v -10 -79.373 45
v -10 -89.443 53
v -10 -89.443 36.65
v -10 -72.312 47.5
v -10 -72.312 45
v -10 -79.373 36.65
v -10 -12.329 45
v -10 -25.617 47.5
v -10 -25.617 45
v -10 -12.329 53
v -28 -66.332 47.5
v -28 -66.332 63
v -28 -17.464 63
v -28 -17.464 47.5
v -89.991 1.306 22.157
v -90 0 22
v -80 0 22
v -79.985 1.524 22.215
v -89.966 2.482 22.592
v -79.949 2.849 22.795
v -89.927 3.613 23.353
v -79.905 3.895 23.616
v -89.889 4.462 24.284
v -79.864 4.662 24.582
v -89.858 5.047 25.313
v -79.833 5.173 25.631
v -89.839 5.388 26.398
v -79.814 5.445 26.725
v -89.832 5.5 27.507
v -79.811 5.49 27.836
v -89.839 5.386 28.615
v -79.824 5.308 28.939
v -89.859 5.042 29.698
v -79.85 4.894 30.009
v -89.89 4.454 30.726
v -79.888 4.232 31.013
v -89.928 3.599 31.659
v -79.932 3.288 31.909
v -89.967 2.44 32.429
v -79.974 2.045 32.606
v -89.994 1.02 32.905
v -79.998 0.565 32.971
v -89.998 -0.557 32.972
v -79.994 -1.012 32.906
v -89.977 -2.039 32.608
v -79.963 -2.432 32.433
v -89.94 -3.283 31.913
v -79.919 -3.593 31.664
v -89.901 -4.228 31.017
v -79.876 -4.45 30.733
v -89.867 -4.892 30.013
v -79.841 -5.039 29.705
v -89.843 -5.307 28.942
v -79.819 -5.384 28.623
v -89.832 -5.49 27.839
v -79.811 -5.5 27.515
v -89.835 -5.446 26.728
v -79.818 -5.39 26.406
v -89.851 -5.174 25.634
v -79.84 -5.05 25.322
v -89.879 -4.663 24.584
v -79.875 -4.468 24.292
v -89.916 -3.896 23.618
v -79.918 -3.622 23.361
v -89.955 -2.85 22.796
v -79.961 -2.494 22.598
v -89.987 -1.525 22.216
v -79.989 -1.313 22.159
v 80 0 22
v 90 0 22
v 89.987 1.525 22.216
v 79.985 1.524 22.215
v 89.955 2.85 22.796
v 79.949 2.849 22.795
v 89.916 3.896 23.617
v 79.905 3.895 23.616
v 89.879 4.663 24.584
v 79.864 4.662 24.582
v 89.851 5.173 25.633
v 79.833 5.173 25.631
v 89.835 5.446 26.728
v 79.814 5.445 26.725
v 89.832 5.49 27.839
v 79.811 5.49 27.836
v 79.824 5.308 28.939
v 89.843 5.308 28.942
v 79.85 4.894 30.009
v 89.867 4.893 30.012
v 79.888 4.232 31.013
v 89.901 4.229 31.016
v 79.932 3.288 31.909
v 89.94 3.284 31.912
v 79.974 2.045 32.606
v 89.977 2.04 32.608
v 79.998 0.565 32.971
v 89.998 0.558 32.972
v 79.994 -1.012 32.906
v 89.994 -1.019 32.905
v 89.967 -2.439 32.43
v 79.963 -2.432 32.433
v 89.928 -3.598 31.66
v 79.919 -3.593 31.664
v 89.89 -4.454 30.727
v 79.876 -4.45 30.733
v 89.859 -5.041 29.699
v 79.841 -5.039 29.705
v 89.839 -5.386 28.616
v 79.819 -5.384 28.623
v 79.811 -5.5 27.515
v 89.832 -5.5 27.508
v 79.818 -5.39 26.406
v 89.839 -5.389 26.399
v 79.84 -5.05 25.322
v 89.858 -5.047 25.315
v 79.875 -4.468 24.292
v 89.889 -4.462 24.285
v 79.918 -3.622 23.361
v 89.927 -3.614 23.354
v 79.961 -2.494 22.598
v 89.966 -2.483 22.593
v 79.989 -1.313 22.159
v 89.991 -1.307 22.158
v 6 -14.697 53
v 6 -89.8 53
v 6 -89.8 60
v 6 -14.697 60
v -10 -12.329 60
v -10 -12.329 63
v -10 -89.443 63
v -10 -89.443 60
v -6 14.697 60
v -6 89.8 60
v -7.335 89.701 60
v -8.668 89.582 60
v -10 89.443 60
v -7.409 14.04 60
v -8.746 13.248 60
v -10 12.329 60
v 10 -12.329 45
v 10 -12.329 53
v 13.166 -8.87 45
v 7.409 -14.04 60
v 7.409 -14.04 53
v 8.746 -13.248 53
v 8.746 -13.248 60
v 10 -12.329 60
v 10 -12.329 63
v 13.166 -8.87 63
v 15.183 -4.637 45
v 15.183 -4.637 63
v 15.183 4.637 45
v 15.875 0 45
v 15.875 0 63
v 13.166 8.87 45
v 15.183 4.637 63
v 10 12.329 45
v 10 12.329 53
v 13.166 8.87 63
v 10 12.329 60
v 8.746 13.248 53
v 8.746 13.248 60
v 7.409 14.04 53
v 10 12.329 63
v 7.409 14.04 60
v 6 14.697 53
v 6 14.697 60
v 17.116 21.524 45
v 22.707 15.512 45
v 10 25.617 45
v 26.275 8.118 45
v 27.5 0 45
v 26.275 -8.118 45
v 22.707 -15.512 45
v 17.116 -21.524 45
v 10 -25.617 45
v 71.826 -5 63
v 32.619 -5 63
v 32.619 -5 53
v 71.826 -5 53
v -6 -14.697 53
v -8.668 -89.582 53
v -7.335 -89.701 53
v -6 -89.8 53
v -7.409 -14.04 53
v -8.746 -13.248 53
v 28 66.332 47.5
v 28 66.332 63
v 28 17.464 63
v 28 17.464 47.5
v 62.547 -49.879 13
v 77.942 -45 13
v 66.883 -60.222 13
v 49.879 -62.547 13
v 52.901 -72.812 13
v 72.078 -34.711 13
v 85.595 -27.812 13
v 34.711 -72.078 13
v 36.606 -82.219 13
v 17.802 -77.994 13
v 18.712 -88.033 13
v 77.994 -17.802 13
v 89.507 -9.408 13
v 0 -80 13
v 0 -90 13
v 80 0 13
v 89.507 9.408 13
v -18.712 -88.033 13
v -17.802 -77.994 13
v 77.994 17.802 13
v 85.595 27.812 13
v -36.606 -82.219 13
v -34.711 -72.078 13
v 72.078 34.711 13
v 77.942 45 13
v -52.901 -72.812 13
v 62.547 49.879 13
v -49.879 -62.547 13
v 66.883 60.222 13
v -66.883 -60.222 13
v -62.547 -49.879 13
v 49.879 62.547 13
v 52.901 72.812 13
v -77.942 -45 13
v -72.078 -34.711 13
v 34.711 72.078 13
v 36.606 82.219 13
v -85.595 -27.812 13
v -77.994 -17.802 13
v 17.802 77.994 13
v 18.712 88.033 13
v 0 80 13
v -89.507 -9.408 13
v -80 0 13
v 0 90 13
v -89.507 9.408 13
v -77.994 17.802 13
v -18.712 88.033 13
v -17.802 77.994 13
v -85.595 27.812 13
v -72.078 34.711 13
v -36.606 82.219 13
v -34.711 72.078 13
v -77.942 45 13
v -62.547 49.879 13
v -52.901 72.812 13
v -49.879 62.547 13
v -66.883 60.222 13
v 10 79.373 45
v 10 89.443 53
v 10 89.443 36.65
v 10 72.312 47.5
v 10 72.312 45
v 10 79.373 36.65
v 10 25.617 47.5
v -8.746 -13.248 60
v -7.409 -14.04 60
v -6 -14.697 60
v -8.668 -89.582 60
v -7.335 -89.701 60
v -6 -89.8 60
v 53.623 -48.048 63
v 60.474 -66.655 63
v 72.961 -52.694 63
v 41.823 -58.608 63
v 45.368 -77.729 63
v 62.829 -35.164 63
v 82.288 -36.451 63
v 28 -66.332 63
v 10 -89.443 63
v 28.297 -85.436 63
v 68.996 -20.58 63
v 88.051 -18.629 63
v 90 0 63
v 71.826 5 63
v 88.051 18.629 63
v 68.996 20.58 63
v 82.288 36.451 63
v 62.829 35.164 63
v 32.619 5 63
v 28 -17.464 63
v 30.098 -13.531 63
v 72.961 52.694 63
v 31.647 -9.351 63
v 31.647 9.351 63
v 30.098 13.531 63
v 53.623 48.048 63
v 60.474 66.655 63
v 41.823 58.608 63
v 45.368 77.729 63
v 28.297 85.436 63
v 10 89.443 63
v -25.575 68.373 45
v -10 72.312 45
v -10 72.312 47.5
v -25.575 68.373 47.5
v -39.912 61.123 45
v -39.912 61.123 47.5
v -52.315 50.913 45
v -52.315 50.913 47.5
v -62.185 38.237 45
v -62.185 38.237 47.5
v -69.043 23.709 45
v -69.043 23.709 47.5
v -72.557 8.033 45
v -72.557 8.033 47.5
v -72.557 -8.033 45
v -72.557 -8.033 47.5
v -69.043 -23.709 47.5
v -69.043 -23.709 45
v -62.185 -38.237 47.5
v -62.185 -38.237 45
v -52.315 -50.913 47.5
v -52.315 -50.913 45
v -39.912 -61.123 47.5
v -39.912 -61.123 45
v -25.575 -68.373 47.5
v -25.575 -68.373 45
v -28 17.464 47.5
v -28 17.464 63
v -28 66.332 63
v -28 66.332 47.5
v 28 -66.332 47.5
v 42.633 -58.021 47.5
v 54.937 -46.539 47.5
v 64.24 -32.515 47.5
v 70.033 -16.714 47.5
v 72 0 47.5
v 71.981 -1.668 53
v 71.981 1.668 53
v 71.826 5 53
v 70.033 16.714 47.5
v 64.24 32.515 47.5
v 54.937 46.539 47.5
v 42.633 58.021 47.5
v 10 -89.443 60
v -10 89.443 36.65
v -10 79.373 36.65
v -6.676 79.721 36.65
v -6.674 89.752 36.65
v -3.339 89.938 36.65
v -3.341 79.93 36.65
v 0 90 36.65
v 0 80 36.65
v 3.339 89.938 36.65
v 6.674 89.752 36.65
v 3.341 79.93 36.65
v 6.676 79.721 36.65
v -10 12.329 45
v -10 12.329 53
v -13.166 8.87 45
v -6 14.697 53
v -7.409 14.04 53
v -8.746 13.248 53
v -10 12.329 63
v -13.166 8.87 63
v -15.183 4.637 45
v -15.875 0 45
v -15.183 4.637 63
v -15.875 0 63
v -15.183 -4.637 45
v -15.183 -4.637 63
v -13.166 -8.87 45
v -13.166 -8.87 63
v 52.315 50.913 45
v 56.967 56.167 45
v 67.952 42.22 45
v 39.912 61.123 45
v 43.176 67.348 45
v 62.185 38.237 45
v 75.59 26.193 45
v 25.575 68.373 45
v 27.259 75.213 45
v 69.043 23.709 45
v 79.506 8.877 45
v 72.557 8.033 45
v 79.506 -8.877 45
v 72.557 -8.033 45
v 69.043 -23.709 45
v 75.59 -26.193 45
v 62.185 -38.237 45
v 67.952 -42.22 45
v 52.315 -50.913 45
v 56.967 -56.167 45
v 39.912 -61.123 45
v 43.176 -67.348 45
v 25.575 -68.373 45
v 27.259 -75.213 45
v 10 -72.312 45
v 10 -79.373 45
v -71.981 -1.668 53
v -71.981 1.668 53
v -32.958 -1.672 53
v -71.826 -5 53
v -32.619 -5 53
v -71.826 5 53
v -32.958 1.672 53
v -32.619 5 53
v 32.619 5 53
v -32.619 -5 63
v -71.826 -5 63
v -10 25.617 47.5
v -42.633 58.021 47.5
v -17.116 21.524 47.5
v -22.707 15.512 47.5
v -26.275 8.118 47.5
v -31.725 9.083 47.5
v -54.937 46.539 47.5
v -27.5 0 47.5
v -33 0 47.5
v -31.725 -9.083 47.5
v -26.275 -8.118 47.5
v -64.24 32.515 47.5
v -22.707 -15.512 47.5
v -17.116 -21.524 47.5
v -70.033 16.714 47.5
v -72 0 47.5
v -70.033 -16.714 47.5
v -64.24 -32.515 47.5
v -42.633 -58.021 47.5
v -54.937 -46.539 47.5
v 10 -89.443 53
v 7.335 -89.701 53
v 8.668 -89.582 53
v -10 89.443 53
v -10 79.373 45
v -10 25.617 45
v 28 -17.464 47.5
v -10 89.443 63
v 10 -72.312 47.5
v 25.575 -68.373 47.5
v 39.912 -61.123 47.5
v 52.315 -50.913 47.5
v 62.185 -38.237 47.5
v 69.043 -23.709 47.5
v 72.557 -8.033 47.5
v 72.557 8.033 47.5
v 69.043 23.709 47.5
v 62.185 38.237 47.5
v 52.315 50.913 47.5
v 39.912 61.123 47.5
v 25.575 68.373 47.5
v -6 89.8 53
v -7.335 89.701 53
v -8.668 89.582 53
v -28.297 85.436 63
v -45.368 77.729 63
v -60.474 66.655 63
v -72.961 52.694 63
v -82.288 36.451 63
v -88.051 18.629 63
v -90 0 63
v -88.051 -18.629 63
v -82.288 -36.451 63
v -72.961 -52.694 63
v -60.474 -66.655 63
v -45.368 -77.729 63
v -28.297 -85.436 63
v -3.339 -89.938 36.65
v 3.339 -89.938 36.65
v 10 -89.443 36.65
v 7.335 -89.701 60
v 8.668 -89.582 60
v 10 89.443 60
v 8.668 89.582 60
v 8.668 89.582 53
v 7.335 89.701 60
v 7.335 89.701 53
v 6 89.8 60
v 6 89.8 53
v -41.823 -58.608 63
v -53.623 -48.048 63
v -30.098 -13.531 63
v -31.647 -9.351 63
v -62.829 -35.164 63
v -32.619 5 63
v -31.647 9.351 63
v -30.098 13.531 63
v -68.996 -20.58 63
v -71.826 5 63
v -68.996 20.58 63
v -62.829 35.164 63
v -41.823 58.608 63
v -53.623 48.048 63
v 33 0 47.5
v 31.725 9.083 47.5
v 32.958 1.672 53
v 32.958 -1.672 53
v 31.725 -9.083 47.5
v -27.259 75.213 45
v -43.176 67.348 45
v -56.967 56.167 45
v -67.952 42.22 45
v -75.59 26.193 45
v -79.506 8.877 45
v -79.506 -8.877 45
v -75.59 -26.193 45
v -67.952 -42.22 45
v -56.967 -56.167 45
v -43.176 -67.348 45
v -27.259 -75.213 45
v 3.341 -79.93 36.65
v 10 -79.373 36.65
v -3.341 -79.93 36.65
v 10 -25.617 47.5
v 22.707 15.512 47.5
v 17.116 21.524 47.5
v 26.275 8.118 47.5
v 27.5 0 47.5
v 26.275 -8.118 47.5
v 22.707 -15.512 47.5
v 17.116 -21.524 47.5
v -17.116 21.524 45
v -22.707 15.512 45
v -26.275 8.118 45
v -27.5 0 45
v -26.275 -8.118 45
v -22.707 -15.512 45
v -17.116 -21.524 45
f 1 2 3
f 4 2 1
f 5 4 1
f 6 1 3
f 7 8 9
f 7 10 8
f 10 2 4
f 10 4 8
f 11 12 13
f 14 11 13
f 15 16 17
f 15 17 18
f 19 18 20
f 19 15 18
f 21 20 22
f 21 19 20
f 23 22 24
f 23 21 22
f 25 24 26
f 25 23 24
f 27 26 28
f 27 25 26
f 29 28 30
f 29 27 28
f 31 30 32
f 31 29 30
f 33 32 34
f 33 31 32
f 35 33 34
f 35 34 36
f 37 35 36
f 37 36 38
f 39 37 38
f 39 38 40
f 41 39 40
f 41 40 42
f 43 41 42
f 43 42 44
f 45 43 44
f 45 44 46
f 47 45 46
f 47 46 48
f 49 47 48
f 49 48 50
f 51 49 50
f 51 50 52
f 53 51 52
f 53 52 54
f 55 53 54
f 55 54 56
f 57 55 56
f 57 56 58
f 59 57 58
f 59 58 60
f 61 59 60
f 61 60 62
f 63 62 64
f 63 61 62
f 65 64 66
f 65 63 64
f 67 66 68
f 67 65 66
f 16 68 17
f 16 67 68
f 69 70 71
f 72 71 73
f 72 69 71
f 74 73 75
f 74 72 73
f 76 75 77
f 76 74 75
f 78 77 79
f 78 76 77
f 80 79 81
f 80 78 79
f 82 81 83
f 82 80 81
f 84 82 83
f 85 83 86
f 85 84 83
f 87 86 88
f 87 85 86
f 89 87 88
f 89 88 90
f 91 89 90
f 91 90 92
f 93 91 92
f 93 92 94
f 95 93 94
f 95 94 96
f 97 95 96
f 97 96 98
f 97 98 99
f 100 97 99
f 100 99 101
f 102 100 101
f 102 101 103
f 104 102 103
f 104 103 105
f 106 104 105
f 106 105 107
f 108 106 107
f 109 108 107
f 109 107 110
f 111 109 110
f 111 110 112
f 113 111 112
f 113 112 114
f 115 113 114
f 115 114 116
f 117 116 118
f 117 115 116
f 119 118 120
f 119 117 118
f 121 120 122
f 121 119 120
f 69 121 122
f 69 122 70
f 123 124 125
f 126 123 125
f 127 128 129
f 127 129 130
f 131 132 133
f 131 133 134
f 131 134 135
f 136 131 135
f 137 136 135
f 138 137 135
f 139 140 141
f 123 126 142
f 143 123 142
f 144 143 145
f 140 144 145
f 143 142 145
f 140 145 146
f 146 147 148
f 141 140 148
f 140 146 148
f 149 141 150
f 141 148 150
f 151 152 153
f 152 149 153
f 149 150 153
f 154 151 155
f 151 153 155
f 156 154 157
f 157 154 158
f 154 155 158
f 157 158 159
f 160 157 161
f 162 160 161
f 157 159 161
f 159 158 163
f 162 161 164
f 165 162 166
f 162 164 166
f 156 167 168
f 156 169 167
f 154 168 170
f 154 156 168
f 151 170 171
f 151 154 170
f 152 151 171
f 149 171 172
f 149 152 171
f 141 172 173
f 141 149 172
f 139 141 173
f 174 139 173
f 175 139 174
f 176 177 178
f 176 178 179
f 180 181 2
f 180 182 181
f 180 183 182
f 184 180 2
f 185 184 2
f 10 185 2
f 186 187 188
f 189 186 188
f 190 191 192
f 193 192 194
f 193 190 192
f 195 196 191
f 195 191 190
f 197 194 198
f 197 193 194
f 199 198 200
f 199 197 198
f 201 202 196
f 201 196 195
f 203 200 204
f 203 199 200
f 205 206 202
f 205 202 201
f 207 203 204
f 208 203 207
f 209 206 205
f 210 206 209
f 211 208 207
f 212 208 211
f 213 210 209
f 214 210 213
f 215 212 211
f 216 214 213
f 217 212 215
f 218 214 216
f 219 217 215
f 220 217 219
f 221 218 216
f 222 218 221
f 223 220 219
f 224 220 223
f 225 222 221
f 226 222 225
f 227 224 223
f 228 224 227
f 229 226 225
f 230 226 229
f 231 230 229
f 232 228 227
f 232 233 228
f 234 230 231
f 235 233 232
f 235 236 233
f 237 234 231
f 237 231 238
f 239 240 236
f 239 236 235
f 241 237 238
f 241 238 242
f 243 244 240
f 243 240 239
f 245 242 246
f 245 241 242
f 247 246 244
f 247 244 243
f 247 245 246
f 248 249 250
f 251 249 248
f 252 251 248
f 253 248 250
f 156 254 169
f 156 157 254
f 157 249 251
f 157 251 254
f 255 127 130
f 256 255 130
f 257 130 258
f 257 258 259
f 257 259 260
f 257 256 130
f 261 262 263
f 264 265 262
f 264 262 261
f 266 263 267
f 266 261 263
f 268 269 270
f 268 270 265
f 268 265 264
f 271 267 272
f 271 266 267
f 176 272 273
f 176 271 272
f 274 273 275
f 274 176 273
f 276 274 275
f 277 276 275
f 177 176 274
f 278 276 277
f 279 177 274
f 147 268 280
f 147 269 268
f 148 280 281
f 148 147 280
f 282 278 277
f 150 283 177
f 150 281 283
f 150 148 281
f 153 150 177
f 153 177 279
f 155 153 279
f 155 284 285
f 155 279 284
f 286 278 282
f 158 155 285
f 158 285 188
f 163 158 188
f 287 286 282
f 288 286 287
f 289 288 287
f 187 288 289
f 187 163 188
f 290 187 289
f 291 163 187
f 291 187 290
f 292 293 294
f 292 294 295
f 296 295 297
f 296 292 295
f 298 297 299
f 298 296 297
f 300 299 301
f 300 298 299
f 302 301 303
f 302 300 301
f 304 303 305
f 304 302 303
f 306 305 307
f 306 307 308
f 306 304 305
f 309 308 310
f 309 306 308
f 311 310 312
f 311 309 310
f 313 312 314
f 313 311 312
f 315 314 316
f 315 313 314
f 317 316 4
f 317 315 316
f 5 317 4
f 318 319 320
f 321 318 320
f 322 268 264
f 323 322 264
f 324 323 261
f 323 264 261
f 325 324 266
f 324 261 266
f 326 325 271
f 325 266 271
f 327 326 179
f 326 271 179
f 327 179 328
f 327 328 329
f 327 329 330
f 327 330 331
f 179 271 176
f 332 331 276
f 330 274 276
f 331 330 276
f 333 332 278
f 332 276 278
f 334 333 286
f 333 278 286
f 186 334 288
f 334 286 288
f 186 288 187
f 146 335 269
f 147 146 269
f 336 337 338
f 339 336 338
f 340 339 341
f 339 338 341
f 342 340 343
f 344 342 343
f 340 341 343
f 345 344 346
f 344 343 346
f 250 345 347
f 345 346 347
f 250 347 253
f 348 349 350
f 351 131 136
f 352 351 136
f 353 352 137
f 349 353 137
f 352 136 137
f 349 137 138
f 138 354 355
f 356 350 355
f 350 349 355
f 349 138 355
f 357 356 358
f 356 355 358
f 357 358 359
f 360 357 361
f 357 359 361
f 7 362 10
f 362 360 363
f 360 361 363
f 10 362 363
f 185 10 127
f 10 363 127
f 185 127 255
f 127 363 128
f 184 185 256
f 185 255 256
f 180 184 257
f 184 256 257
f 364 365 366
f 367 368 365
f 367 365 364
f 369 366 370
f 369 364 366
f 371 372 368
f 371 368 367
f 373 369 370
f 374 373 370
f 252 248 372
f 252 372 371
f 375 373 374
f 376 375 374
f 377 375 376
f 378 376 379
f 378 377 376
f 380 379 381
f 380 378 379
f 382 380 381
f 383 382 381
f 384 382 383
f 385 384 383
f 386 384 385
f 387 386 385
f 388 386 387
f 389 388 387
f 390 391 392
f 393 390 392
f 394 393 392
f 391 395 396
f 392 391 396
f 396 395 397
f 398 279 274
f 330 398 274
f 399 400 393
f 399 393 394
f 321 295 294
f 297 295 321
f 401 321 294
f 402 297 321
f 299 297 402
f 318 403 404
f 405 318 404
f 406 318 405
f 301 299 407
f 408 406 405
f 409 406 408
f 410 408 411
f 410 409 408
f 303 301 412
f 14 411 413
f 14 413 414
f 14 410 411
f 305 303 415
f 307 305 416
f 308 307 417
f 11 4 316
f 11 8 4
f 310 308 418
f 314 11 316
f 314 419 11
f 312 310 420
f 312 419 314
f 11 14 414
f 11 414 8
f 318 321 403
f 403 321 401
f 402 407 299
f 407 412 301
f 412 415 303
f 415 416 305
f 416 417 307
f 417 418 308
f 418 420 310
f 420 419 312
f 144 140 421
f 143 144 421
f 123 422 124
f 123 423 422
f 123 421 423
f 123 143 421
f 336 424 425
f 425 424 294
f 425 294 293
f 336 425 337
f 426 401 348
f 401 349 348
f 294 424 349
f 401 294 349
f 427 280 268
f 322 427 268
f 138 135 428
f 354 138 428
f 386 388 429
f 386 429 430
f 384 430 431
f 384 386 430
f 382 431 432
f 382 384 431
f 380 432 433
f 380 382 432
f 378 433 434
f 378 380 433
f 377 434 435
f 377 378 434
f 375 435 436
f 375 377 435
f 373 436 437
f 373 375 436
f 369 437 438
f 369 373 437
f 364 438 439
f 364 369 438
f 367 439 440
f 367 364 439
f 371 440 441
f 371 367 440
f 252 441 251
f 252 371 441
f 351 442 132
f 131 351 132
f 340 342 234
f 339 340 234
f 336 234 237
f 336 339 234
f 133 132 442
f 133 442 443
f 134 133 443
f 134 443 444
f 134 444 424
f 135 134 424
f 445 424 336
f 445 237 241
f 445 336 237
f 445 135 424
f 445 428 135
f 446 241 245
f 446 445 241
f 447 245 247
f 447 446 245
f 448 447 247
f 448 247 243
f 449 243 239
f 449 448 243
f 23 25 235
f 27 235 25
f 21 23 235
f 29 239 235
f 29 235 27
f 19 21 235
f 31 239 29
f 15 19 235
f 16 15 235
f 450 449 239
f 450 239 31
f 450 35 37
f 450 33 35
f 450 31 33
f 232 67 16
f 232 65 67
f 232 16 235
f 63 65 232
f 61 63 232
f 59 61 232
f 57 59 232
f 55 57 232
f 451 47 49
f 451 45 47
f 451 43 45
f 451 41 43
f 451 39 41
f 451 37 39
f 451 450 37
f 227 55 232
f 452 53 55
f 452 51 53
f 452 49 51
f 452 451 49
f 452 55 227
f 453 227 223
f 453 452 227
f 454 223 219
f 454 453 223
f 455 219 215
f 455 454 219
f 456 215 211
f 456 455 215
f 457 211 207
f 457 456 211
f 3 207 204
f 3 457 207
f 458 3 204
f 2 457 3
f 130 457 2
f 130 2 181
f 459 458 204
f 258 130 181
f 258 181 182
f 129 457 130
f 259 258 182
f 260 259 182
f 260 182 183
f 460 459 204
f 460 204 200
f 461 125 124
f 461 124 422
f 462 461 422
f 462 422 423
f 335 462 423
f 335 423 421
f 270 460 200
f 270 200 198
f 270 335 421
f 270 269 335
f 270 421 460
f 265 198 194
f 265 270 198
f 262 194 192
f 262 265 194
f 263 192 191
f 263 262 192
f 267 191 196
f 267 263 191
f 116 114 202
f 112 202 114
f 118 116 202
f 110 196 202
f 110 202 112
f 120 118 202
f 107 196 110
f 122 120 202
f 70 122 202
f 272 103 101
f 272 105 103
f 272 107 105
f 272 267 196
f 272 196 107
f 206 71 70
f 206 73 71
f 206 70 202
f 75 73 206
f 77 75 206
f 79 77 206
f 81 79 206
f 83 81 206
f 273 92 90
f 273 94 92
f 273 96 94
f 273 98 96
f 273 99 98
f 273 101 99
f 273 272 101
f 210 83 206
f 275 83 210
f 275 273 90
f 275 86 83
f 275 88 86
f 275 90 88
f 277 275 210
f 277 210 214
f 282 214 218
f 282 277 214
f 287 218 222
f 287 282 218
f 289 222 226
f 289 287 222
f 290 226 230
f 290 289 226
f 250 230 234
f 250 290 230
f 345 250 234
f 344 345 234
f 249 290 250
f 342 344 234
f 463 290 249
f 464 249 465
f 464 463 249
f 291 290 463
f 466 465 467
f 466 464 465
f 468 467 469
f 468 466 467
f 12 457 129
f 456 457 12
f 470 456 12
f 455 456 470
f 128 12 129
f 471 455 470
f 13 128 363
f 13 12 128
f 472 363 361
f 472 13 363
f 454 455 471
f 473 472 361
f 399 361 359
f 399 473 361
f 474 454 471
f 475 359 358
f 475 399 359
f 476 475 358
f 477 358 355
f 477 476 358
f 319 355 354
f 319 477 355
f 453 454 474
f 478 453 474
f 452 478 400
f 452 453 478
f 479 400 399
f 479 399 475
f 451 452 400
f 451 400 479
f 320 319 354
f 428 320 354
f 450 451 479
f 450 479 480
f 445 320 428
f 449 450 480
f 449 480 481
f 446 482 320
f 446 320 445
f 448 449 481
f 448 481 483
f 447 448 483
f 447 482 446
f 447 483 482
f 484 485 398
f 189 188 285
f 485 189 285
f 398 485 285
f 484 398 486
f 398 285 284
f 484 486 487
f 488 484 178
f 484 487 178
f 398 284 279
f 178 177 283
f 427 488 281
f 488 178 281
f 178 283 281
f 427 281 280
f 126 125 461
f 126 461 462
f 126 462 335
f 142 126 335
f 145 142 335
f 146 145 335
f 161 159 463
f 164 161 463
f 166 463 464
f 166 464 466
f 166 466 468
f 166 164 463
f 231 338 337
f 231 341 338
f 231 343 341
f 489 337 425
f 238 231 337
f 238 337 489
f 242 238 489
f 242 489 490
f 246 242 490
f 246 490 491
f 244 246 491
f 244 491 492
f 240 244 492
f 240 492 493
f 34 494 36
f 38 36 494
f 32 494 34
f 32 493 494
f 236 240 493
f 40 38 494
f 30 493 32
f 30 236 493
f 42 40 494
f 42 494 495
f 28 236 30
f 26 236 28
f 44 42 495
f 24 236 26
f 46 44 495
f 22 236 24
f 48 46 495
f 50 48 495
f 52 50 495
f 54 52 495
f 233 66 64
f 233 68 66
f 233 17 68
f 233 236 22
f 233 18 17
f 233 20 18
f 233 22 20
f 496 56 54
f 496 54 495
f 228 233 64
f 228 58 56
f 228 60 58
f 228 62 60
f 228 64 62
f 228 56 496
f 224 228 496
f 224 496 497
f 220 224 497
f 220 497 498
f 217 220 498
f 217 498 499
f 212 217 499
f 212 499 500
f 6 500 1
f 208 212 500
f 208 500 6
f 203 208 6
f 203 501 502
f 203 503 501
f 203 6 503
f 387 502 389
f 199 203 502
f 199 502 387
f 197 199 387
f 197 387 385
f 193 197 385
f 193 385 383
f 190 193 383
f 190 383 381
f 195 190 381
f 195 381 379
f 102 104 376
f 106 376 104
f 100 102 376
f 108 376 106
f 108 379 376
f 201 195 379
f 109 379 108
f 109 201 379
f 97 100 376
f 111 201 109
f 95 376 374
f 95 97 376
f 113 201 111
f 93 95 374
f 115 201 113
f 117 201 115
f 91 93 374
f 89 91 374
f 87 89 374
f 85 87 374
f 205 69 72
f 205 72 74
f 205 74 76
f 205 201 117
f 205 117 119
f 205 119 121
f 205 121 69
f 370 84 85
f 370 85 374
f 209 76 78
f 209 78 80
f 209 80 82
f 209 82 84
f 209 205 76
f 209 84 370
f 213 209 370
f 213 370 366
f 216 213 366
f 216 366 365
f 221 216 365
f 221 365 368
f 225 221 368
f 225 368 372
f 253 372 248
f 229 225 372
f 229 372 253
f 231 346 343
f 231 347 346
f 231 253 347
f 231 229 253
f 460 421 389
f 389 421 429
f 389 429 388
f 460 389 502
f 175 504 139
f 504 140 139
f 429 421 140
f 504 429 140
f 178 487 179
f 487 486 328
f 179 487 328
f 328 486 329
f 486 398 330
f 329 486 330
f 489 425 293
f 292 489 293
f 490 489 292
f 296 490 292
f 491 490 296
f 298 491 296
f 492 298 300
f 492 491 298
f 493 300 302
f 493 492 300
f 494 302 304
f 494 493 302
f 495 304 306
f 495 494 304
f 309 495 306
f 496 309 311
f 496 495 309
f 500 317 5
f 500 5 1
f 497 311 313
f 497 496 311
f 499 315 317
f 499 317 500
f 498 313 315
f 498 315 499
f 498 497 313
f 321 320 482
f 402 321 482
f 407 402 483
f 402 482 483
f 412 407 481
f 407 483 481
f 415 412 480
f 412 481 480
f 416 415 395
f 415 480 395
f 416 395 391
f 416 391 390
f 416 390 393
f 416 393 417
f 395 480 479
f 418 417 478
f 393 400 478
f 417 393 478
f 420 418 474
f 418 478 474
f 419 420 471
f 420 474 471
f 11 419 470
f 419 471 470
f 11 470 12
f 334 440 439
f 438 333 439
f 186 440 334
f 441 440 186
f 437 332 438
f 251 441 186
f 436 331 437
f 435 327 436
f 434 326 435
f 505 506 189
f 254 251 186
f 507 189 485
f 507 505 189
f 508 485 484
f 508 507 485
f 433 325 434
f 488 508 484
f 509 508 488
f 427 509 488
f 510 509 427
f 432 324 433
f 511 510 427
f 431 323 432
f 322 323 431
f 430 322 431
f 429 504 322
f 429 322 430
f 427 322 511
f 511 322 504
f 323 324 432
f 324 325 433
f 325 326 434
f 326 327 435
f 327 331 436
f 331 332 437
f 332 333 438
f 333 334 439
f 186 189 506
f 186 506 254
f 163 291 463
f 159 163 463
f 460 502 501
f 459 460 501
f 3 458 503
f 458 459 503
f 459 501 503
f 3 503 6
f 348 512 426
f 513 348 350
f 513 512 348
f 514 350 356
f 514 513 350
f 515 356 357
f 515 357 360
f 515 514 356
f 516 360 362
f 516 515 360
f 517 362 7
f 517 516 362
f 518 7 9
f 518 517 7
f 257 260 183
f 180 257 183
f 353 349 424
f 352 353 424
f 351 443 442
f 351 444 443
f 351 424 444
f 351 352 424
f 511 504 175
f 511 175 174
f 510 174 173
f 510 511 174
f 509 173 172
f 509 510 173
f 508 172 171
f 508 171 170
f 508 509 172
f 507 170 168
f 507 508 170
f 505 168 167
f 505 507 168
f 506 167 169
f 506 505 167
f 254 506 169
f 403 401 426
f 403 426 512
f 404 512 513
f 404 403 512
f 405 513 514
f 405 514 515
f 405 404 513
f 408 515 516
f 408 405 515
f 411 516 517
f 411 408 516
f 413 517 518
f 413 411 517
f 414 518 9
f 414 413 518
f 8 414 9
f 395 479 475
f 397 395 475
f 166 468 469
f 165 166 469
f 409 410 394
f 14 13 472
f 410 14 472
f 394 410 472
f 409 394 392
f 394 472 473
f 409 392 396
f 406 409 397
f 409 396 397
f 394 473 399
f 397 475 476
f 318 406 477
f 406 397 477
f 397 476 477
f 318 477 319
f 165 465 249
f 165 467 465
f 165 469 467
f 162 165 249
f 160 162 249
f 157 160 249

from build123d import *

# Parameters (mm, degrees)
CUT_EXTRUDE1_DEPTH       = 91
CUT_EXTRUDE13_START      = 79.372539
SKETCH35_W               = 20
SKETCH35_H               = 8.35
CUT_EXTRUDE13_DEPTH      = 10.627461
CIRPATTERN1_COUNT        = 2
CUT_EXTRUDE14_DEPTH      = 64
SKETCH38_W               = 301.896550135
SKETCH38_H               = 232.512752758
CUT_EXTRUDE15_DEPTH      = 13
SKETCH39_W               = 54.010562882
SKETCH39_H               = 10
SKETCH39_W_2             = 56.106077308
BOSS_EXTRUDE1_DEPTH      = 10
SKETCH17_R               = 5.5
CUT_EXTRUDE18_DEPTH      = 181
CUT_EXTRUDE18_DEPTH_BACK = 1
SKETCH42_R               = 15.875
CUT_EXTRUDE19_DEPTH      = 40


with BuildPart() as part:
    # Sketch3 → Revolve2 (revolve)
    with BuildSketch(Plane(origin=(0, 0, 0), x_dir=(0, 0, -1), z_dir=(1, 0, 0))):
        Polygon((-45, 80), (0, 80), (0, 90), (-63, 90), (-63, 15), (-45, 15), (-45, 27.5), (-47.5, 27.5), (-47.5, 73), (-45, 73), align=None)
    revolve(axis=Axis((0, 0, 0), (0, 0, 1)))

    # Sketch4 → Cut-Extrude1 (cut, through all)
    with BuildSketch(Plane(origin=(0, 0, 0), x_dir=(1, 0, 0), z_dir=(0, 1, 0))):
        Polygon((10, -53), (10, -45), (-10, -45), (-10, -53), (-6, -53), (-6, -60), (-10, -60), (-10, -63), (10, -63), (10, -60), (6, -60), (6, -53), align=None)
    cut_extrude1 = extrude(amount=CUT_EXTRUDE1_DEPTH, mode=Mode.SUBTRACT)

    # Sketch35 → Cut-Extrude13 (cut)
    with BuildSketch(Plane(origin=(0, 0, 0), x_dir=(1, 0, 0), z_dir=(0, 1, 0)).offset(CUT_EXTRUDE13_START)):
        with Locations((0, -40.825)):
            Rectangle(SKETCH35_W, SKETCH35_H)
    cut_extrude13 = extrude(amount=CUT_EXTRUDE13_DEPTH, mode=Mode.SUBTRACT)

    # CirPattern1: Cut-Extrude1, Cut-Extrude13 ×2 about axis
    cirpattern1_axis = Axis((0, 0, 0), (0, 0, 1))
    for i in range(1, CIRPATTERN1_COUNT):
        add(cut_extrude1.rotate(cirpattern1_axis, i * 360 / CIRPATTERN1_COUNT), mode=Mode.SUBTRACT)
        add(cut_extrude13.rotate(cirpattern1_axis, i * 360 / CIRPATTERN1_COUNT), mode=Mode.SUBTRACT)

    # Sketch37 → Cut-Extrude14 (cut, through all)
    with BuildSketch(Plane.XY.offset(63)):
        with BuildLine():
            Line((-28, -66.332495807), (-28, -17.464249197))
            ThreePointArc((-28, -17.464249197), (-33, 0), (-28, 17.464249197))
            Line((-28, 17.464249197), (-28, 66.332495807))
            ThreePointArc((-28, 66.332495807), (-72, 0), (-28, -66.332495807))
        make_face()
        with BuildLine():
            Line((28, -17.464249197), (28, -66.332495807))
            ThreePointArc((28, -66.332495807), (72, 0), (28, 66.332495807))
            Line((28, 66.332495807), (28, 17.464249197))
            ThreePointArc((28, 17.464249197), (33, 0), (28, -17.464249197))
        make_face()
    extrude(amount=-CUT_EXTRUDE14_DEPTH, mode=Mode.SUBTRACT)

    # Sketch38 → Cut-Extrude15 (cut)
    with BuildSketch(Plane(origin=(0, 0, 0), x_dir=(-1, 0, 0), z_dir=(0, 0, -1))):
        with Locations((8.285843347, -5.180042081)):
            Rectangle(SKETCH38_W, SKETCH38_H)
    extrude(amount=-CUT_EXTRUDE15_DEPTH, mode=Mode.SUBTRACT)

    # Sketch39 → Boss-Extrude1 (add)
    with BuildSketch(Plane.XY.offset(63)):
        with Locations((47.183112068, 0)):
            Rectangle(SKETCH39_W, SKETCH39_H)
        with Locations((-51.507331201, 0)):
            Rectangle(SKETCH39_W_2, SKETCH39_H)
    extrude(amount=-BOSS_EXTRUDE1_DEPTH)

    # Sketch17 → Cut-Extrude18 (cut, two sides)
    with BuildSketch(Plane(origin=(-90, 0, 0), x_dir=(0, 0, -1), z_dir=(1, 0, 0))) as cut_extrude18_sk:
        with Locations((-27.5, 0)):
            Circle(SKETCH17_R)
    extrude(amount=CUT_EXTRUDE18_DEPTH, mode=Mode.SUBTRACT)
    extrude(cut_extrude18_sk.sketch, amount=-CUT_EXTRUDE18_DEPTH_BACK, mode=Mode.SUBTRACT)

    # Sketch42 → Cut-Extrude19 (cut)
    with BuildSketch(Plane.XY.offset(63)):
        Circle(SKETCH42_R)
    extrude(amount=-CUT_EXTRUDE19_DEPTH, mode=Mode.SUBTRACT)


solid = part.part
